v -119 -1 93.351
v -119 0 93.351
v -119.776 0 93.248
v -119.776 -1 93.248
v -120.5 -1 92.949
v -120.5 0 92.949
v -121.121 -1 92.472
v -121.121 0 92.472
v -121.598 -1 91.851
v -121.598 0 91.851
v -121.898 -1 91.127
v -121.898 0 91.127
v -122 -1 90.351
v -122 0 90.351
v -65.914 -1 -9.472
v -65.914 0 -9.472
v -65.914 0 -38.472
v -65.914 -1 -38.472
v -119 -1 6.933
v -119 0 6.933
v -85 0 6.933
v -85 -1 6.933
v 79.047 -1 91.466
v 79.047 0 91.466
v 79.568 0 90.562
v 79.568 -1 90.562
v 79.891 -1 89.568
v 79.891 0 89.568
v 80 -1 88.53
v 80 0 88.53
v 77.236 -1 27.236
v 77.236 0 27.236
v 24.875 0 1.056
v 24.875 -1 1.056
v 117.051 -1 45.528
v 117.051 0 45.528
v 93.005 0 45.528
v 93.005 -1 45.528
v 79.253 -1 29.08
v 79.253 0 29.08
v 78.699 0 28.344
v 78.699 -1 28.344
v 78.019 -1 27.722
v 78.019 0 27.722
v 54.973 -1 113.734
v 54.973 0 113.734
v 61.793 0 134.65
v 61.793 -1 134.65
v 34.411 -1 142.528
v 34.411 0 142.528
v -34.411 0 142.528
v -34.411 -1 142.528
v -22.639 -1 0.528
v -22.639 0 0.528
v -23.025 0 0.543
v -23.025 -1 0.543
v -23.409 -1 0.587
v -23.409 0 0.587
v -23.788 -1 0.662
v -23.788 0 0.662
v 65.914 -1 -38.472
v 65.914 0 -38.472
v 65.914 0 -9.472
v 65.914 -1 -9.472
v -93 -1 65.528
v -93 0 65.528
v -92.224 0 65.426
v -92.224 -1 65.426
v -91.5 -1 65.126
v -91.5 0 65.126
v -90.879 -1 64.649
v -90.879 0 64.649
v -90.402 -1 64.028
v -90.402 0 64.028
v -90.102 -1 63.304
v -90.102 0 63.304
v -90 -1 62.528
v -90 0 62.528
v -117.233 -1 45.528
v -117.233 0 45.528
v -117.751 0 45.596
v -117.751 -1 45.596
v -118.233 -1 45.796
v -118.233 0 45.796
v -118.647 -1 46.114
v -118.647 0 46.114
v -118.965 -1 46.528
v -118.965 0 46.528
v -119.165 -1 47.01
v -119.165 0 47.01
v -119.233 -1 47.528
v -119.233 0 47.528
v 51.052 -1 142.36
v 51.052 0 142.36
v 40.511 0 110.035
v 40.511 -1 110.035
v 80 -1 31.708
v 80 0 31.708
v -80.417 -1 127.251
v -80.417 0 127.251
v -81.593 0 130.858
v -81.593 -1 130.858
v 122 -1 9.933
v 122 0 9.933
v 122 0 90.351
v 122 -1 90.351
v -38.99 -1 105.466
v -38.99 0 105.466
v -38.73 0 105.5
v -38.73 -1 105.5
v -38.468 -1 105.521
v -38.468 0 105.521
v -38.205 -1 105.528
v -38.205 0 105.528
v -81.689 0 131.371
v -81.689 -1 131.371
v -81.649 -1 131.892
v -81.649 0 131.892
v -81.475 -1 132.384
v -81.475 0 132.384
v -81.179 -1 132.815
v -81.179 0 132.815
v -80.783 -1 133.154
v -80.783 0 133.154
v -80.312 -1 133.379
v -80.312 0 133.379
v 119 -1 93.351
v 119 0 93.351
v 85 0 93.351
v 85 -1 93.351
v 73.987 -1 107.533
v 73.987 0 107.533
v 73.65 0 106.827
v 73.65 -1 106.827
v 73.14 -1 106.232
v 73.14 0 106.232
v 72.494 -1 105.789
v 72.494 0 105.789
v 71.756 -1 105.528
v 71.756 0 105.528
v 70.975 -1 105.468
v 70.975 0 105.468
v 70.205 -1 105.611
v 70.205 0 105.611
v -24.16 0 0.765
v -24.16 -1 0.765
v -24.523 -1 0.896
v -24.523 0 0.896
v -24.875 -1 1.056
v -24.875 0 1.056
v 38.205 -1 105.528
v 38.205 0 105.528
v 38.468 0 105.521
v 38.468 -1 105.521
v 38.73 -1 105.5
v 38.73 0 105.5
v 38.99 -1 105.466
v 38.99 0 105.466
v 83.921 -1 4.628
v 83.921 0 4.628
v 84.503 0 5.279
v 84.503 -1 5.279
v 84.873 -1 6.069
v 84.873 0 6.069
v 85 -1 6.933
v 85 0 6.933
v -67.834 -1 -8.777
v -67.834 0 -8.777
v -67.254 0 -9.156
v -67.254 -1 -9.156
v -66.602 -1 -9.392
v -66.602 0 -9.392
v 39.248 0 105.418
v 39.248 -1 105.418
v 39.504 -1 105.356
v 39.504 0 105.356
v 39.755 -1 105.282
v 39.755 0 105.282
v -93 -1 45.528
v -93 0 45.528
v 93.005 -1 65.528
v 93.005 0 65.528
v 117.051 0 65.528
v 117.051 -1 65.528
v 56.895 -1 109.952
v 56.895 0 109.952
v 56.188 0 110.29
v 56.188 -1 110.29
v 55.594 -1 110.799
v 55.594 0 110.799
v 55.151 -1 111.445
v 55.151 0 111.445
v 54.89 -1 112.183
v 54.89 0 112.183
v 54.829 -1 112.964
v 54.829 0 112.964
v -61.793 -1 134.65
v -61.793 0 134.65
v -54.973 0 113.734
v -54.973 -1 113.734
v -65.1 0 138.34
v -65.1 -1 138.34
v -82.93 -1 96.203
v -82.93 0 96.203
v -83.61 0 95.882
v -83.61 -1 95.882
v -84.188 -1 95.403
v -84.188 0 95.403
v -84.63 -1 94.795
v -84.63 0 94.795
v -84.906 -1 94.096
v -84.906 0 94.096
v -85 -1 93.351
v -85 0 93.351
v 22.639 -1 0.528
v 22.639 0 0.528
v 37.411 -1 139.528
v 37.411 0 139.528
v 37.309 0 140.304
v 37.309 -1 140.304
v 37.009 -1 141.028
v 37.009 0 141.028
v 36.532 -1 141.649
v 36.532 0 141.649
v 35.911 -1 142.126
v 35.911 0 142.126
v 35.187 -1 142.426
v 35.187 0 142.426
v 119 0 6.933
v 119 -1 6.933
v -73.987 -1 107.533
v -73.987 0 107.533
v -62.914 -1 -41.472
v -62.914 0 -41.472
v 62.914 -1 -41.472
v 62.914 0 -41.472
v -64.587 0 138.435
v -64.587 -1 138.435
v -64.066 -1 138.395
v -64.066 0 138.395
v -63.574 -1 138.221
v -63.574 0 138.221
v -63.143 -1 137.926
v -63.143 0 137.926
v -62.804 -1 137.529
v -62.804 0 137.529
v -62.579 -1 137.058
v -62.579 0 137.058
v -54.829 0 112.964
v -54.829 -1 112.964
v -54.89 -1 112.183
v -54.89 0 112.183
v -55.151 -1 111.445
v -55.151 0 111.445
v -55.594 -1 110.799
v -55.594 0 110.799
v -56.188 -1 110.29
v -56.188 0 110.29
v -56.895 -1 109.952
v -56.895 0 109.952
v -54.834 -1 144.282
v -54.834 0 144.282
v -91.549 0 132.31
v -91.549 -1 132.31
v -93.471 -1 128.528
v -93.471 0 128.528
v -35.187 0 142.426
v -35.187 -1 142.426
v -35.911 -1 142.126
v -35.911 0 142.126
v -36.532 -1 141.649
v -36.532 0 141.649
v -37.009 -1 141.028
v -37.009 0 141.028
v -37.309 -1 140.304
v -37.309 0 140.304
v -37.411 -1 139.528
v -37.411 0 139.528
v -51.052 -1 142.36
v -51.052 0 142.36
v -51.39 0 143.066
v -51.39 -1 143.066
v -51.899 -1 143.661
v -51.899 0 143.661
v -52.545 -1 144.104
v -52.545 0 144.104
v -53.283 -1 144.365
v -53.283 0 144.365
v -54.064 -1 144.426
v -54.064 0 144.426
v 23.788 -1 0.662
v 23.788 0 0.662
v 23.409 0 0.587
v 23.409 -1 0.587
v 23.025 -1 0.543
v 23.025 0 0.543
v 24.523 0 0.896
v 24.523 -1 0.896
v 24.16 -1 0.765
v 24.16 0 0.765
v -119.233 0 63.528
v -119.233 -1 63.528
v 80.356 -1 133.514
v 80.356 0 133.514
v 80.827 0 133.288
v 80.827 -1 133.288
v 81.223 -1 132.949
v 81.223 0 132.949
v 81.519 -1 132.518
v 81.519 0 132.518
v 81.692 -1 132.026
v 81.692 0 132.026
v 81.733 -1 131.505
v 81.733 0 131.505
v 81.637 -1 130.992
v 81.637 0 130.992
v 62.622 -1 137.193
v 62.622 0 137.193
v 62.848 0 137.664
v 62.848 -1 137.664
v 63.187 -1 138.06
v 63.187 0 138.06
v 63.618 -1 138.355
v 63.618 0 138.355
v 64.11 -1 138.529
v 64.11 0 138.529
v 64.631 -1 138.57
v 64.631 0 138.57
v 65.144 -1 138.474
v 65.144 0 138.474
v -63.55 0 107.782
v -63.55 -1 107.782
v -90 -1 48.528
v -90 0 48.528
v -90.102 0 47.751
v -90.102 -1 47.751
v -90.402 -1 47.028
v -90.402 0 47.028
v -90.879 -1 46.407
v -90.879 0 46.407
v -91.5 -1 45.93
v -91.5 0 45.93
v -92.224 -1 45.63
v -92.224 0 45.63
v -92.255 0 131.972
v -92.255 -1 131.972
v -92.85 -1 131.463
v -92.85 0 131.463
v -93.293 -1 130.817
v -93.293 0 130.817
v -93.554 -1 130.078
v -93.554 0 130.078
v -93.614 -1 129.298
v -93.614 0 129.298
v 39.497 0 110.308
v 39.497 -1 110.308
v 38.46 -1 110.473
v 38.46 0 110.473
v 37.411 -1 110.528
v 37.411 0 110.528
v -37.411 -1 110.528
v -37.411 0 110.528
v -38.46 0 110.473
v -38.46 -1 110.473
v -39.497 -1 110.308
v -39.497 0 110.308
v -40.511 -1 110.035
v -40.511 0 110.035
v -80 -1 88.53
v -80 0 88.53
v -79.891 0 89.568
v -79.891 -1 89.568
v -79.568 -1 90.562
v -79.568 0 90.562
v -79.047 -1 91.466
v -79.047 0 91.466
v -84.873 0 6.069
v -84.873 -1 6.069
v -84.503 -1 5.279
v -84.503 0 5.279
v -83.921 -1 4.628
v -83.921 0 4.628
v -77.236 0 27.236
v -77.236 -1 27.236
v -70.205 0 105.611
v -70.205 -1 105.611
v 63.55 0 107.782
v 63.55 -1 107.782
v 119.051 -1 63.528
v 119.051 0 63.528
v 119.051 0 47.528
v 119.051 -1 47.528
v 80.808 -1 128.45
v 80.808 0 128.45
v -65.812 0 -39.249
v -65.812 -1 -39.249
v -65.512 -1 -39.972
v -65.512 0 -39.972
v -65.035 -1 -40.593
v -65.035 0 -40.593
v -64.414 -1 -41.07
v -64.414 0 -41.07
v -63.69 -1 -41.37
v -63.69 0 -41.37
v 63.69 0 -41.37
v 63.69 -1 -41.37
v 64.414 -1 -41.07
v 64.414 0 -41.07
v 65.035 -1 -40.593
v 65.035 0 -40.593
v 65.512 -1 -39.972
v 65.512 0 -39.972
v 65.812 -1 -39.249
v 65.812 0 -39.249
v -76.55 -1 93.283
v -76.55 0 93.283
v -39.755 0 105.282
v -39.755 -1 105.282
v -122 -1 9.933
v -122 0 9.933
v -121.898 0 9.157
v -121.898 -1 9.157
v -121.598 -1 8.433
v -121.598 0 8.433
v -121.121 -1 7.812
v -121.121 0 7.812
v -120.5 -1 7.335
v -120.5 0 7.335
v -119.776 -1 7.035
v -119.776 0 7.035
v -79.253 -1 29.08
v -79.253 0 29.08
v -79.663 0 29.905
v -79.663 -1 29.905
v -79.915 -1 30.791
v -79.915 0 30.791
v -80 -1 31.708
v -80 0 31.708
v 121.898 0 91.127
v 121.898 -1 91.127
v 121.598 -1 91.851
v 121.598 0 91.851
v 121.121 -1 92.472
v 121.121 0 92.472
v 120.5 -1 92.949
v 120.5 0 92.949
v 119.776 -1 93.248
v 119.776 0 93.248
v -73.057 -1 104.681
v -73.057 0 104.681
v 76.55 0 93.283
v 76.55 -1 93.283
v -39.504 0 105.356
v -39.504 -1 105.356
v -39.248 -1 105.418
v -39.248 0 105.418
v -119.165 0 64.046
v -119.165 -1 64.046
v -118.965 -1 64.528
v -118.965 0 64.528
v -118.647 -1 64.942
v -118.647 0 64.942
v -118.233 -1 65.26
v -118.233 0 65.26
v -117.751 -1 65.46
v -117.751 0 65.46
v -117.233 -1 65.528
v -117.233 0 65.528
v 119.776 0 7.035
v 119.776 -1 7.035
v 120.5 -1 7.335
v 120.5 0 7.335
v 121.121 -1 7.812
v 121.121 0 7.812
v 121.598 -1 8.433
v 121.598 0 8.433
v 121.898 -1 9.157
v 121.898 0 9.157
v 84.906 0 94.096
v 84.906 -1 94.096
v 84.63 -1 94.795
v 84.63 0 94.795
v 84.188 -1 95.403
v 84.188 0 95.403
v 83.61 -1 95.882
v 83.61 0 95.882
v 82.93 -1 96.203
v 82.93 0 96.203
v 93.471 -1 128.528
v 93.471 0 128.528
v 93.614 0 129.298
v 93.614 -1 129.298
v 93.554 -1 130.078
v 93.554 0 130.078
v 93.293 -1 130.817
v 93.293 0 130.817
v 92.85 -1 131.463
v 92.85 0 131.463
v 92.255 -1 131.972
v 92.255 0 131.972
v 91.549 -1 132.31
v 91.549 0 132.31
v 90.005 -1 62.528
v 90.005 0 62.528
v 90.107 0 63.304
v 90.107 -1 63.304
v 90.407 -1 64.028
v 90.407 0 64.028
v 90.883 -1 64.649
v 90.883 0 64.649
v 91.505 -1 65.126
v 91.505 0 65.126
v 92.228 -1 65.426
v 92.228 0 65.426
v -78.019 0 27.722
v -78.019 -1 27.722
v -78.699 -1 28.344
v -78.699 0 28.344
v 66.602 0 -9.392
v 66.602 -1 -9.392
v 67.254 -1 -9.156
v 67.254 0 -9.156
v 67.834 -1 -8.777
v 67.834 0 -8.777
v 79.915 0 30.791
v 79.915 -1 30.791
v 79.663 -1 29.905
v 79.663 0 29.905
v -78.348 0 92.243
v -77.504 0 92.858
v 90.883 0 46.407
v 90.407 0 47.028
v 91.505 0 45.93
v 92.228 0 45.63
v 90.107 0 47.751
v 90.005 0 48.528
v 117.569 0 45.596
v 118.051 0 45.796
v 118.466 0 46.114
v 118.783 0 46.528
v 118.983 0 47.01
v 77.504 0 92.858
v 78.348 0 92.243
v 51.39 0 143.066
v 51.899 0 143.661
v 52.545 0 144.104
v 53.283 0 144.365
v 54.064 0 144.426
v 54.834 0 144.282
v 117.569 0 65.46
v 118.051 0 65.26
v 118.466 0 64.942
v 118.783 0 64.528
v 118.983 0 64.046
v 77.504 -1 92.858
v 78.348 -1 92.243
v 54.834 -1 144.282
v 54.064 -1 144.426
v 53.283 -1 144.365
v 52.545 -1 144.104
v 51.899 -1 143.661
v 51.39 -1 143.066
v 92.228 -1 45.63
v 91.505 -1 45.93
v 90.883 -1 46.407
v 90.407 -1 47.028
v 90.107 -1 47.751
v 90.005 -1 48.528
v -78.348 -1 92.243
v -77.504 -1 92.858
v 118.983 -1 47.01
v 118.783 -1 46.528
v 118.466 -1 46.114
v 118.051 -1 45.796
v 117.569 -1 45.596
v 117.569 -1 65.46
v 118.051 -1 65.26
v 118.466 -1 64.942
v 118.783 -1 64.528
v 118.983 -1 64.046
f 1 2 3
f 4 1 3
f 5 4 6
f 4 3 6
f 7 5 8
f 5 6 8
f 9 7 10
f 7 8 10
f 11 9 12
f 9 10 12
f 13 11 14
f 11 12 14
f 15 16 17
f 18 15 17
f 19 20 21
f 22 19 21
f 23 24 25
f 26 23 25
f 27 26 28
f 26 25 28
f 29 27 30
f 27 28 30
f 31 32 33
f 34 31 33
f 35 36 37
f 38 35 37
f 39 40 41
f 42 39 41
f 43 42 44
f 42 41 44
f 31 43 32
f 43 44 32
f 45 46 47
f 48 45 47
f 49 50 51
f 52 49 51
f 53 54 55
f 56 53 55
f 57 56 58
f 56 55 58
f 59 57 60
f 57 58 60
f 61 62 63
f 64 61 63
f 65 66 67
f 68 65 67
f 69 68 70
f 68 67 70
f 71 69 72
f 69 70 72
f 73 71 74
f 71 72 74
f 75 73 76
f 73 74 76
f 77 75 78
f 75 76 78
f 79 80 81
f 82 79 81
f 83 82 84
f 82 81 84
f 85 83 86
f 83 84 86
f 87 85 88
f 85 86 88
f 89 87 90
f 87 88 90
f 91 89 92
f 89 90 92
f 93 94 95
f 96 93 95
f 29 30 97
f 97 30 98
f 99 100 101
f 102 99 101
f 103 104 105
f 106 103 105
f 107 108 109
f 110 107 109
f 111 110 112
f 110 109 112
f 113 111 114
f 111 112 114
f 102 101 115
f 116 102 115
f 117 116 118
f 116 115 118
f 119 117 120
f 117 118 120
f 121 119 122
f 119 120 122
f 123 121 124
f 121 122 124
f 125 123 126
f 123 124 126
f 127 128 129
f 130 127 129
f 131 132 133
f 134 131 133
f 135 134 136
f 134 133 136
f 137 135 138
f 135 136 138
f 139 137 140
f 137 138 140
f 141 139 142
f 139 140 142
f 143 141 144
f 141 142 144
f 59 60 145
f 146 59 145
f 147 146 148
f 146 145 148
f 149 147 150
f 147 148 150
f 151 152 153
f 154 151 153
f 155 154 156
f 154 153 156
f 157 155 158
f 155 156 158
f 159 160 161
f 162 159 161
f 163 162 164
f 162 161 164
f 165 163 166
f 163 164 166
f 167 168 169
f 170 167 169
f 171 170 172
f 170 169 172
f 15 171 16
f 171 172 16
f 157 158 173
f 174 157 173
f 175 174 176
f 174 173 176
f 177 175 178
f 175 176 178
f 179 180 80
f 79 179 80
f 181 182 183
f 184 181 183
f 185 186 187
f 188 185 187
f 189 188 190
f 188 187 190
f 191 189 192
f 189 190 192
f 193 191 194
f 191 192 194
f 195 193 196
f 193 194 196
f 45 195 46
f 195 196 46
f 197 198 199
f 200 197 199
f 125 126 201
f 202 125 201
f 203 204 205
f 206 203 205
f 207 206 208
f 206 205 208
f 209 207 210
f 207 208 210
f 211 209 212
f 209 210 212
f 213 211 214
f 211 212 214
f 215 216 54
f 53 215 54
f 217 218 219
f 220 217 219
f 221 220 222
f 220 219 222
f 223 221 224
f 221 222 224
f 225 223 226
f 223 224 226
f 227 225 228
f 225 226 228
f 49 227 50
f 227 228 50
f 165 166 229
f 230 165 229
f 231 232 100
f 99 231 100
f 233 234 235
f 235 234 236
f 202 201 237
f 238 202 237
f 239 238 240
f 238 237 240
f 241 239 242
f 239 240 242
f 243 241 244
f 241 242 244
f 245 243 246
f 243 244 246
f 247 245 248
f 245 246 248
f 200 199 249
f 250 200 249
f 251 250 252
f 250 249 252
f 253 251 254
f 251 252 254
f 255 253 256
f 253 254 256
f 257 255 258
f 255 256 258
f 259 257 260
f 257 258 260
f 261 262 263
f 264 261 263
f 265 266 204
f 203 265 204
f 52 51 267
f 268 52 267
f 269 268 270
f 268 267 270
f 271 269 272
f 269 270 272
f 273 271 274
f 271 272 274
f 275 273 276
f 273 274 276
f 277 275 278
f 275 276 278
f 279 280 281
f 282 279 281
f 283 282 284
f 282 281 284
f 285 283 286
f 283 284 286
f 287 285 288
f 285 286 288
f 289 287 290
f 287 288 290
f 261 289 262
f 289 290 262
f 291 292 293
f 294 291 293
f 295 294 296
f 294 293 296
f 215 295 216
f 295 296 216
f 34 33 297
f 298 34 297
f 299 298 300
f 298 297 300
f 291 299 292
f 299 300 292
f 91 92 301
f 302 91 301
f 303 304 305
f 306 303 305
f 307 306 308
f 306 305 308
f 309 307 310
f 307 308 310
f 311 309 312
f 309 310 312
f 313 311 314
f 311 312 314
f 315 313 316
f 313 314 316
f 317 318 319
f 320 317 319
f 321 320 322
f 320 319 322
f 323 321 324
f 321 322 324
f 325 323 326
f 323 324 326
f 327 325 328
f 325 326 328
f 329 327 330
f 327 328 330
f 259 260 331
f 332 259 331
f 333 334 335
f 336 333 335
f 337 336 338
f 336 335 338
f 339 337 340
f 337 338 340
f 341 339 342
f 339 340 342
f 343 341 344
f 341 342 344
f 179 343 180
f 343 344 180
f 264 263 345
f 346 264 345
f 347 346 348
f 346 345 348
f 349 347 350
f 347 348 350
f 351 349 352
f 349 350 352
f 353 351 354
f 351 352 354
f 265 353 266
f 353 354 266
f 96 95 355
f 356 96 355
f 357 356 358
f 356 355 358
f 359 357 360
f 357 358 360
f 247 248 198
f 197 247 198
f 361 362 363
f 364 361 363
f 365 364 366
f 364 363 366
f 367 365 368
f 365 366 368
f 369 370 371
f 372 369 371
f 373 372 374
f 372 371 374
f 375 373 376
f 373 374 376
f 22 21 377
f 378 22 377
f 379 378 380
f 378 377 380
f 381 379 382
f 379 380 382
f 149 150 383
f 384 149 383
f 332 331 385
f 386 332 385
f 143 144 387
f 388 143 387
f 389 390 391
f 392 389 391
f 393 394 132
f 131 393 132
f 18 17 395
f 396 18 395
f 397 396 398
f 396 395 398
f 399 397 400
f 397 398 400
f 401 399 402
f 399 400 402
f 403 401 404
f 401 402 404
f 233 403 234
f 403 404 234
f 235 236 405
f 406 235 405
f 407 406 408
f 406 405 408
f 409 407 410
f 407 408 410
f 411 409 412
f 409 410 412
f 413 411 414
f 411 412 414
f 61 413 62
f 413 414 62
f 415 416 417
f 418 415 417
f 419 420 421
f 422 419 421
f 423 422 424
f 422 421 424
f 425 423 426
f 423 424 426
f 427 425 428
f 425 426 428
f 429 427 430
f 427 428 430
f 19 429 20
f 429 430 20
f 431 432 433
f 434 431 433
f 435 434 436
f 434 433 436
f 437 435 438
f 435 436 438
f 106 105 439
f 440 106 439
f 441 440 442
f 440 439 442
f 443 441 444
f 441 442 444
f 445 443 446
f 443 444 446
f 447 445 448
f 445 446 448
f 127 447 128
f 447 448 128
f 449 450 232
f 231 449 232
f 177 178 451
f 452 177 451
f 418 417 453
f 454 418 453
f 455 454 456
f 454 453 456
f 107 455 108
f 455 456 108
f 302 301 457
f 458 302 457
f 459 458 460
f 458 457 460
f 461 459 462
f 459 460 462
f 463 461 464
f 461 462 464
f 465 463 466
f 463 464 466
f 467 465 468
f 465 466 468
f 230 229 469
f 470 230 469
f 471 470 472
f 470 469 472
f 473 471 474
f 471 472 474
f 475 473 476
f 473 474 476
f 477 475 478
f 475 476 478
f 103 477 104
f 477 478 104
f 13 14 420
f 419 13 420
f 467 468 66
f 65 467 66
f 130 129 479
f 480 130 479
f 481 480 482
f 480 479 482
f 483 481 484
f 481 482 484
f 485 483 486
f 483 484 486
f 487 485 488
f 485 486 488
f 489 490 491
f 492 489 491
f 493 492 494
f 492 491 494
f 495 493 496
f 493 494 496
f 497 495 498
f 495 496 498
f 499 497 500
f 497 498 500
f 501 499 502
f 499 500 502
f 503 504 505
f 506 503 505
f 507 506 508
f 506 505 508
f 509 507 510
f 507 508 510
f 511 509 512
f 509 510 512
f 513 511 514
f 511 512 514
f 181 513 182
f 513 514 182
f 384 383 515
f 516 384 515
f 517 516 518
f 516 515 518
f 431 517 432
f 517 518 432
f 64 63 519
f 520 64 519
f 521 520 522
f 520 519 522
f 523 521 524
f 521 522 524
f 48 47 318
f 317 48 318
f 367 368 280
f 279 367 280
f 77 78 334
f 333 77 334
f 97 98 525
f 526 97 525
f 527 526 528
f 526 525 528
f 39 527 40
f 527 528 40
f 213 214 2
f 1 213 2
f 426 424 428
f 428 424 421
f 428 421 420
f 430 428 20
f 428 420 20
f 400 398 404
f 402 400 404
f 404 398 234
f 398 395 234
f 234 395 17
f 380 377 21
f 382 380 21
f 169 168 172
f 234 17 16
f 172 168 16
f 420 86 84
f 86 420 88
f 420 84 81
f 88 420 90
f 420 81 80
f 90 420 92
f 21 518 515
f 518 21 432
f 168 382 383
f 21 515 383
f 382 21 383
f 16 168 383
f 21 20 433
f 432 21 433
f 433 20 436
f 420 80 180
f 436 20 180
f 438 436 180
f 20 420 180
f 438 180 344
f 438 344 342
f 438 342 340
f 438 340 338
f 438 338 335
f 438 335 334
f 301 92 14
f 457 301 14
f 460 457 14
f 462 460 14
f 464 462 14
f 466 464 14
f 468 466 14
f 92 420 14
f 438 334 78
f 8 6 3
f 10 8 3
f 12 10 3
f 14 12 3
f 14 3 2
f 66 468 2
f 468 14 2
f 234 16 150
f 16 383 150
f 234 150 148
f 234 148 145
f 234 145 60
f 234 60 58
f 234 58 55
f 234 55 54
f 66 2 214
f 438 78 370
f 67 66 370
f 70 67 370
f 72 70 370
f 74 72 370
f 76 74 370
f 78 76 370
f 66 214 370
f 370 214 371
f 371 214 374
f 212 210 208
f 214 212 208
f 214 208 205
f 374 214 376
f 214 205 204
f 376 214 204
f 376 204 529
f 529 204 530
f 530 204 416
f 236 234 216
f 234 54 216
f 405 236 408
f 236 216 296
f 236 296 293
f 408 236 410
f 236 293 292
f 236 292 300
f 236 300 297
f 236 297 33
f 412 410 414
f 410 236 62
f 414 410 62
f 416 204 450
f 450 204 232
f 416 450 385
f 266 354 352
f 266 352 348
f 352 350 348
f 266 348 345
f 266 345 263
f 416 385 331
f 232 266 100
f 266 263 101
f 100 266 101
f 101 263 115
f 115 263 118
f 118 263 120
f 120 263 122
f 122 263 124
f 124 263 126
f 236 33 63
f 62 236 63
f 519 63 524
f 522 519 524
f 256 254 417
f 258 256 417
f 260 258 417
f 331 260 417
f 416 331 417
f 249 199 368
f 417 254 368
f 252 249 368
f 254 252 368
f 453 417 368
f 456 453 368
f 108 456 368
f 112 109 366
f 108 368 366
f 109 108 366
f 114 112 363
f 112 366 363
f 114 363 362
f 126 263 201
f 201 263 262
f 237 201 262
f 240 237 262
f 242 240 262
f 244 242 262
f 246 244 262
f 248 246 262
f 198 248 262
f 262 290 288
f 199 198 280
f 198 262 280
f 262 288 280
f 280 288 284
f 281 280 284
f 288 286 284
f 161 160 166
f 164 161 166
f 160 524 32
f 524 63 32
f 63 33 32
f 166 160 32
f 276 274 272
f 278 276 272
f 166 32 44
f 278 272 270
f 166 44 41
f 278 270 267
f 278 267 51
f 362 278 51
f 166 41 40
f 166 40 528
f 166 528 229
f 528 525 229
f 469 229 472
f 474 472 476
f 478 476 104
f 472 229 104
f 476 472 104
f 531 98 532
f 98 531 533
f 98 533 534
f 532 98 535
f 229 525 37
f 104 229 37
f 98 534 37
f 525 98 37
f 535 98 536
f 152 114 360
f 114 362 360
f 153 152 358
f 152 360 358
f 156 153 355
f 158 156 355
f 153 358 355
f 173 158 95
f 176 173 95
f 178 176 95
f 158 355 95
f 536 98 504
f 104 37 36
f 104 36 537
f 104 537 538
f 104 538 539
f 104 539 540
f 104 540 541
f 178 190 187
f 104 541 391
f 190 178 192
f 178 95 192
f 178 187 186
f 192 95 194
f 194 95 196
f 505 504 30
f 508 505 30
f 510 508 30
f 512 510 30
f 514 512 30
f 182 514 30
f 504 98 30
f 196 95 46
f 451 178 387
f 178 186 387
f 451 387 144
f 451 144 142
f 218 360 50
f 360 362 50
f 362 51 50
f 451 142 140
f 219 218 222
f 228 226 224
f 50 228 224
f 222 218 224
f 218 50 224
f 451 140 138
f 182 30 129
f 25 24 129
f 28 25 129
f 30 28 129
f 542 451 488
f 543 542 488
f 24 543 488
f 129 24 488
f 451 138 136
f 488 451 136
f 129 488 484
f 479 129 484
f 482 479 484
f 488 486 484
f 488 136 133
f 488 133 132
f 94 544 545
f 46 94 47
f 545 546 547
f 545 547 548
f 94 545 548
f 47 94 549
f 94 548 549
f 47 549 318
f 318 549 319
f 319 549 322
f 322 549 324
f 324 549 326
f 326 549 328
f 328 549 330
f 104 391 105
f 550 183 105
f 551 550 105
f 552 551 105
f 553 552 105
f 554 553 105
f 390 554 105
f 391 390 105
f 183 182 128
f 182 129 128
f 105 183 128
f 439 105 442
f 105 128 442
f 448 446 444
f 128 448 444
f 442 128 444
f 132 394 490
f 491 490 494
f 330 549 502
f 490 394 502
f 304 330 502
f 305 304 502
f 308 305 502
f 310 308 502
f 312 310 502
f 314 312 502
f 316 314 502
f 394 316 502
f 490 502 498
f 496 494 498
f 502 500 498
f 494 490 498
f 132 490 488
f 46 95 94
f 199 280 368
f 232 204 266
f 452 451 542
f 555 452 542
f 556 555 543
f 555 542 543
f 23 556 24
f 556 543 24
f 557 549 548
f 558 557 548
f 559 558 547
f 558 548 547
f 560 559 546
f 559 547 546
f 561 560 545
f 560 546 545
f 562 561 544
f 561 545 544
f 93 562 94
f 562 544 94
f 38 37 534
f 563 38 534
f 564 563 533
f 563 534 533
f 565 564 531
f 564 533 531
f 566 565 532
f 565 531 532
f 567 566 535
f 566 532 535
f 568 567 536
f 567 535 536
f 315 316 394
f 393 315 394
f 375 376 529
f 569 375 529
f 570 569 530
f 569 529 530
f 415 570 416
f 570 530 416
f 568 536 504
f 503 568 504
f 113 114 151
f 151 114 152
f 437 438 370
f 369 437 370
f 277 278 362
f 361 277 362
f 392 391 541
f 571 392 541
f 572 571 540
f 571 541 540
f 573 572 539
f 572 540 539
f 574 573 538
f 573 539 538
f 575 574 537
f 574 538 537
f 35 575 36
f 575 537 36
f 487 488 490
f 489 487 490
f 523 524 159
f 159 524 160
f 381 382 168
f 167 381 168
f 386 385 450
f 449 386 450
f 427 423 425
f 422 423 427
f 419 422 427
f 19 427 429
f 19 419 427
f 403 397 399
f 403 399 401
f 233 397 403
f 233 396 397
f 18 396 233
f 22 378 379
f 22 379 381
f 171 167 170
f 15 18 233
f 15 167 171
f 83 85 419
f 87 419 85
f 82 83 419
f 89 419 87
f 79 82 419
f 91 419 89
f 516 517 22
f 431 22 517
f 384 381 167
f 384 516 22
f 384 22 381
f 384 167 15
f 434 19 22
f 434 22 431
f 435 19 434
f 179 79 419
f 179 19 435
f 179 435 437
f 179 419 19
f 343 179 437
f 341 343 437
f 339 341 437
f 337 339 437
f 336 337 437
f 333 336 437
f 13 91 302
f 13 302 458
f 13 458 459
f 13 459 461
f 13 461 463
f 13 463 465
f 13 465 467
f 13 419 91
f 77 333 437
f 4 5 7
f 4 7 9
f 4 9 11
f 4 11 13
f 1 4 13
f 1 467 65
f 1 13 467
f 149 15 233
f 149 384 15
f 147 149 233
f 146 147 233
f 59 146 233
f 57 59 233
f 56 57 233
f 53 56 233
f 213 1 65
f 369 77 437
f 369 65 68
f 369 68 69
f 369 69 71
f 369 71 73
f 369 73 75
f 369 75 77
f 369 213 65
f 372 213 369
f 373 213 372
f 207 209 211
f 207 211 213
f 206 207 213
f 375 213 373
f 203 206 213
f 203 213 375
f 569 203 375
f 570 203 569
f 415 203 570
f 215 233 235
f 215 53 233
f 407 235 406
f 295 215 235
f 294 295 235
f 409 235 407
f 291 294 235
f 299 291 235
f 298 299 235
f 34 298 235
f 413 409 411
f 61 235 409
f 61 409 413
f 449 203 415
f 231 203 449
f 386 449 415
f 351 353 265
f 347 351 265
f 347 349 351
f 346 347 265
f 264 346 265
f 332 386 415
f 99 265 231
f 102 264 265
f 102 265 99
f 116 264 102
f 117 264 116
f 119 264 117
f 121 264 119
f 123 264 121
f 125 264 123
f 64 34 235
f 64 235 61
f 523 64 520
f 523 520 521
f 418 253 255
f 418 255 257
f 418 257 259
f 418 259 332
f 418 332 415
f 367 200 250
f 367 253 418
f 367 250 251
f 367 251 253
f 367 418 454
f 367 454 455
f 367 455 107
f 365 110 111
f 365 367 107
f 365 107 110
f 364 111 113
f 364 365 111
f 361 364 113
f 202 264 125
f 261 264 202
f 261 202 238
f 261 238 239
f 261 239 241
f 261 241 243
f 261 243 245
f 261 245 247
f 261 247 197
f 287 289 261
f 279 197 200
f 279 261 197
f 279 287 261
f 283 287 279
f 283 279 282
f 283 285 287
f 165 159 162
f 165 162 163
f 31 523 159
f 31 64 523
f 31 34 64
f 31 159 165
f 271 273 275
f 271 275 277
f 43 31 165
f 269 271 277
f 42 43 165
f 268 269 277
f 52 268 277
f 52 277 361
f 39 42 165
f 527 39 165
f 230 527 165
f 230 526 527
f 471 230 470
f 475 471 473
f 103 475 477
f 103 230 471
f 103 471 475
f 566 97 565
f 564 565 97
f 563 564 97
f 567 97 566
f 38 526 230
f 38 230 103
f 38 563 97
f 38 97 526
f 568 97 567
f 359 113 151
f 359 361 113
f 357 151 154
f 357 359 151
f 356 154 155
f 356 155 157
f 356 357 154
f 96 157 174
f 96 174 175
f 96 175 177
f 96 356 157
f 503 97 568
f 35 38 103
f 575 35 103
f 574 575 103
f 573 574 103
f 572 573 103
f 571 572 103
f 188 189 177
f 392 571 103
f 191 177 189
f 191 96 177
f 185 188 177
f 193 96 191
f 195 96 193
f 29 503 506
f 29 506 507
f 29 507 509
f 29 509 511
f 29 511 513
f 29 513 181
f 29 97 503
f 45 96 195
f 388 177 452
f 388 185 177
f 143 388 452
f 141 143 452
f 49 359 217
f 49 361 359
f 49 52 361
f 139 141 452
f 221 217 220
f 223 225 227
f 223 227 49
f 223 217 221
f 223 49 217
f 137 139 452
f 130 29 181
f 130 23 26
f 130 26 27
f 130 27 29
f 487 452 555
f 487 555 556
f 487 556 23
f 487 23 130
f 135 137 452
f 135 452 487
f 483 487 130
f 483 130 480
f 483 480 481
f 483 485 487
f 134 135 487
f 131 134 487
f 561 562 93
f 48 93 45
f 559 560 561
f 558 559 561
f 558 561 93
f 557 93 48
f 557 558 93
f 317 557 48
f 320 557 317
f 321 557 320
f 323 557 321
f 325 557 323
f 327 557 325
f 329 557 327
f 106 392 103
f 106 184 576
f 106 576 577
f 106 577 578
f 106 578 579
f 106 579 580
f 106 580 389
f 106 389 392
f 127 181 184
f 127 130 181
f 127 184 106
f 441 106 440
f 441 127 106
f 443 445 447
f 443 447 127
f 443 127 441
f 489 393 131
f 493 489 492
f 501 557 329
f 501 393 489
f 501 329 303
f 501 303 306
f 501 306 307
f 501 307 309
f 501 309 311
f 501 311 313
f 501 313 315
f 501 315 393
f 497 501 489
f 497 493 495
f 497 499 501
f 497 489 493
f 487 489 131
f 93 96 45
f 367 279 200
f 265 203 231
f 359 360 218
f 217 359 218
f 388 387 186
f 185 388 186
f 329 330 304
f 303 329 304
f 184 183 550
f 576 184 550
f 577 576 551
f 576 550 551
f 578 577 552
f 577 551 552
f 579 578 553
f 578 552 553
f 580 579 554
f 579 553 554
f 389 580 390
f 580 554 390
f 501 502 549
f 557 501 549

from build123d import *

# Parameters (mm, degrees)
F1_DEPTH = 1


# Not quite as in the source:
# - a feature names something its author has since deleted; it is built from what else it names


with BuildPart() as f1:
    # F0 (on Front) → F1 (new body)
    with BuildSketch(Plane.XZ):
        with BuildLine():
            ThreePointArc((83.920553199, 4.6283250442), (84.7167682637, 5.6605226942), (85, 6.932988883))
            Line((85, 6.932988883), (85, 25.527864045))
            Line((85, 25.527864045), (85, 45.527864045))
            Line((85, 45.527864045), (85, 55.527864045))
            Line((85, 55.527864045), (85, 65.527864045))
            Line((85, 65.527864045), (85, 90.527864045))
            Line((85, 90.527864045), (85, 93.3506543745))
            ThreePointArc((85, 93.3506543745), (84.4279811983, 95.1127290894), (82.9300617995, 96.202843893))
            Line((82.9300617995, 96.202843893), (71.5072983948, 99.9276580467))
            Line((71.5072983948, 99.9276580467), (62, 103.027864045))
            Line((62, 103.027864045), (52.4927016052, 106.1280700433))
            Line((52.4927016052, 106.1280700433), (40.5109515892, 110.0351624398))
            ThreePointArc((40.5109515892, 110.0351624398), (38.9803022245, 110.4039205441), (37.4107455909, 110.527864045))
            Line((37.4107455909, 110.527864045), (37.4107455909, 139.527864045))
            ThreePointArc((37.4107455909, 139.527864045), (36.5320659345, 141.6491843886), (34.4107455909, 142.527864045))
            Line((34.4107455909, 142.527864045), (0, 142.527864045))
            Line((0, 142.527864045), (-34.4107455909, 142.527864045))
            ThreePointArc((-34.4107455909, 142.527864045), (-36.5320659345, 141.6491843886), (-37.4107455909, 139.527864045))
            Line((-37.4107455909, 139.527864045), (-37.4107455909, 110.527864045))
            ThreePointArc((-37.4107455909, 110.527864045), (-38.9803022245, 110.4039205441), (-40.5109515892, 110.0351624398))
            Line((-40.5109515892, 110.0351624398), (-52.4927016052, 106.1280700433))
            Line((-52.4927016052, 106.1280700433), (-62, 103.027864045))
            Line((-62, 103.027864045), (-71.5072983948, 99.9276580467))
            Line((-71.5072983948, 99.9276580467), (-82.9300617995, 96.202843893))
            ThreePointArc((-82.9300617995, 96.202843893), (-84.4279811983, 95.1127290894), (-85, 93.3506543745))
            Line((-85, 93.3506543745), (-85, 90.527864045))
            Line((-85, 90.527864045), (-85, 65.527864045))
            Line((-85, 65.527864045), (-85, 45.527864045))
            Line((-85, 45.527864045), (-85, 25.527864045))
            Line((-85, 25.527864045), (-85, 6.932988883))
            ThreePointArc((-85, 6.932988883), (-84.7167682637, 5.6605226942), (-83.920553199, 4.6283250442))
            Line((-83.920553199, 4.6283250442), (-67.8344033934, -8.7767997938))
            ThreePointArc((-67.8344033934, -8.7767997938), (-66.9351259857, -9.292950688), (-65.9138501945, -9.472135955))
            Line((-65.9138501945, -9.472135955), (-65.9138501945, -38.472135955))
            ThreePointArc((-65.9138501945, -38.472135955), (-65.035170538, -40.5934562986), (-62.9138501945, -41.472135955))
            Line((-62.9138501945, -41.472135955), (0, -41.472135955))
            Line((0, -41.472135955), (62.9138501945, -41.472135955))
            ThreePointArc((62.9138501945, -41.472135955), (65.035170538, -40.5934562986), (65.9138501945, -38.472135955))
            Line((65.9138501945, -38.472135955), (65.9138501945, -9.472135955))
            ThreePointArc((65.9138501945, -9.472135955), (66.9351259857, -9.292950688), (67.8344033934, -8.7767997938))
            Line((67.8344033934, -8.7767997938), (83.920553199, 4.6283250442))
        make_face()
        with BuildLine():
            ThreePointArc((38.9901511122, 105.4658922946), (39.3764477711, 105.3887881754), (39.7554757946, 105.2815132424))
            Line((39.7554757946, 105.2815132424), (76.5501029992, 93.2832652409))
            ThreePointArc((76.5501029992, 93.2832652409), (77.9421273317, 92.5723733654), (79.0466353305, 91.466407235))
            ThreePointArc((79.0466353305, 91.466407235), (79.7556900999, 90.0734462394), (80, 88.5296160435))
            Line((80, 88.5296160435), (80, 31.7082039325))
            ThreePointArc((80, 31.7082039325), (79.8096917889, 30.3418712879), (79.2532540418, 29.0795483719))
            ThreePointArc((79.2532540418, 29.0795483719), (78.3730446274, 28.0173273508), (77.2360679775, 27.2360679775))
            Line((77.2360679775, 27.2360679775), (24.8753882025, 1.05572809))
            ThreePointArc((24.8753882025, 1.05572809), (24.3431697998, 0.8271304186), (23.7880848277, 0.6616190977))
            ThreePointArc((23.7880848277, 0.6616190977), (23.2175828225, 0.5614153774), (22.639320225, 0.527864045))
            Line((22.639320225, 0.527864045), (0, 0.527864045))
            Line((0, 0.527864045), (-22.639320225, 0.527864045))
            ThreePointArc((-22.639320225, 0.527864045), (-23.2175828225, 0.5614153774), (-23.7880848277, 0.6616190977))
            ThreePointArc((-23.7880848277, 0.6616190977), (-24.3431697998, 0.8271304186), (-24.8753882025, 1.05572809))
            Line((-24.8753882025, 1.05572809), (-77.2360679775, 27.2360679775))
            ThreePointArc((-77.2360679775, 27.2360679775), (-78.3730446274, 28.0173273508), (-79.2532540418, 29.0795483719))
            ThreePointArc((-79.2532540418, 29.0795483719), (-79.8096917889, 30.3418712879), (-80, 31.7082039325))
            Line((-80, 31.7082039325), (-80, 88.5296160435))
            ThreePointArc((-80, 88.5296160435), (-79.7556900999, 90.0734462394), (-79.0466353305, 91.466407235))
            ThreePointArc((-79.0466353305, 91.466407235), (-77.9421273317, 92.5723733654), (-76.5501029992, 93.2832652409))
            Line((-76.5501029992, 93.2832652409), (-39.7554757946, 105.2815132424))
            ThreePointArc((-39.7554757946, 105.2815132424), (-39.3764477711, 105.3887881754), (-38.9901511122, 105.4658922946))
            ThreePointArc((-38.9901511122, 105.4658922946), (-38.5989834865, 105.5123470296), (-38.2053727955, 105.527864045))
            Line((-38.2053727955, 105.527864045), (0, 105.527864045))
            Line((0, 105.527864045), (38.2053727955, 105.527864045))
            ThreePointArc((38.2053727955, 105.527864045), (38.5989834865, 105.5123470296), (38.9901511122, 105.4658922946))
        make_face(mode=Mode.SUBTRACT)
        with BuildLine():
            Line((71.5072983948, 99.9276580467), (82.9300617995, 96.202843893))
            Line((82.9300617995, 96.202843893), (93.4707621937, 128.5276584354))
            ThreePointArc((93.4707621937, 128.5276584354), (93.2930282304, 130.8168697792), (91.5486344748, 132.3099097533))
            Line((91.5486344748, 132.3099097533), (54.8339033014, 144.2821047011))
            ThreePointArc((54.8339033014, 144.2821047011), (52.5446919576, 144.1043707378), (51.0516519835, 142.3599769822))
            Line((51.0516519835, 142.3599769822), (40.5109515892, 110.0351624398))
            Line((40.5109515892, 110.0351624398), (52.4927016052, 106.1280700433))
            Line((52.4927016052, 106.1280700433), (62, 103.027864045))
            Line((62, 103.027864045), (71.5072983948, 99.9276580467))
        make_face()
        with BuildLine():
            Line((70.2052118755, 105.6113690436), (63.5501029992, 107.7815132424))
            Line((63.5501029992, 107.7815132424), (56.8949941228, 109.9516574412))
            ThreePointArc((56.8949941228, 109.9516574412), (55.1506003672, 111.4446974153), (54.9728664038, 113.7339087592))
            Line((54.9728664038, 113.7339087592), (61.7933196001, 134.6499652278))
            Line((61.7933196001, 134.6499652278), (62.6224189104, 137.192536446))
            ThreePointArc((62.6224189104, 137.192536446), (63.6177788931, 138.3554656164), (65.143919789, 138.4739549253))
            Line((65.143919789, 138.4739549253), (80.3555972207, 133.513625328))
            ThreePointArc((80.3555972207, 133.513625328), (81.5185263911, 132.5182653453), (81.6370157, 130.9921244494))
            Line((81.6370157, 130.9921244494), (80.8079163897, 128.4495532311))
            Line((80.8079163897, 128.4495532311), (73.9874631935, 107.5334967625))
            ThreePointArc((73.9874631935, 107.5334967625), (72.4944232194, 105.789103007), (70.2052118755, 105.6113690436))
        make_face(mode=Mode.SUBTRACT)
        with BuildLine():
            Line((85, 25.527864045), (85, 6.932988883))
            Line((85, 6.932988883), (114, 6.932988883))
            Line((114, 6.932988883), (117, 6.932988883))
            Line((117, 6.932988883), (119, 6.932988883))
            ThreePointArc((119, 6.932988883), (121.1213203436, 7.8116685394), (122, 9.932988883))
            Line((122, 9.932988883), (122, 90.3506543745))
            ThreePointArc((122, 90.3506543745), (121.1213203436, 92.4719747181), (119, 93.3506543745))
            Line((119, 93.3506543745), (117, 93.3506543745))
            Line((117, 93.3506543745), (114, 93.3506543745))
            Line((114, 93.3506543745), (85, 93.3506543745))
            Line((85, 93.3506543745), (85, 90.527864045))
            Line((85, 90.527864045), (85, 65.527864045))
            Line((85, 65.527864045), (85, 55.527864045))
            Line((85, 55.527864045), (85, 45.527864045))
            Line((85, 45.527864045), (85, 25.527864045))
        make_face()
        with BuildLine():
            Line((90.0046601892, 48.527864045), (90.0046601892, 55.527864045))
            Line((90.0046601892, 55.527864045), (90.0046601892, 62.527864045))
            ThreePointArc((90.0046601892, 62.527864045), (90.8833398456, 64.6491843886), (93.0046601892, 65.527864045))
            Line((93.0046601892, 65.527864045), (117.0514340997, 65.527864045))
            ThreePointArc((117.0514340997, 65.527864045), (118.465647662, 64.9420776074), (119.0514340997, 63.527864045))
            Line((119.0514340997, 63.527864045), (119.0514340997, 55.527864045))
            Line((119.0514340997, 55.527864045), (119.0514340997, 47.527864045))
            ThreePointArc((119.0514340997, 47.527864045), (118.465647662, 46.1136504826), (117.0514340997, 45.527864045))
            Line((117.0514340997, 45.527864045), (93.0046601892, 45.527864045))
            ThreePointArc((93.0046601892, 45.527864045), (90.8833398456, 46.4065437014), (90.0046601892, 48.527864045))
        make_face(mode=Mode.SUBTRACT)
        with BuildLine():
            Line((-114, 6.932988883), (-85, 6.932988883))
            Line((-85, 6.932988883), (-85, 25.527864045))
            Line((-85, 25.527864045), (-85, 45.527864045))
            Line((-85, 45.527864045), (-85, 65.527864045))
            Line((-85, 65.527864045), (-85, 90.527864045))
            Line((-85, 90.527864045), (-85, 93.3506543745))
            Line((-85, 93.3506543745), (-114, 93.3506543745))
            Line((-114, 93.3506543745), (-117, 93.3506543745))
            Line((-117, 93.3506543745), (-119, 93.3506543745))
            ThreePointArc((-119, 93.3506543745), (-121.1213203436, 92.4719747181), (-122, 90.3506543745))
            Line((-122, 90.3506543745), (-122, 9.932988883))
            ThreePointArc((-122, 9.932988883), (-121.1213203436, 7.8116685394), (-119, 6.932988883))
            Line((-119, 6.932988883), (-117, 6.932988883))
            Line((-117, 6.932988883), (-114, 6.932988883))
        make_face()
        with BuildLine():
            Line((-90, 55.527864045), (-90, 48.527864045))
            ThreePointArc((-90, 48.527864045), (-90.8786796564, 46.4065437014), (-93, 45.527864045))
            Line((-93, 45.527864045), (-108.2668378949, 45.527864045))
            Line((-108.2668378949, 45.527864045), (-115, 45.527864045))
            Line((-115, 45.527864045), (-116, 45.527864045))
            Line((-116, 45.527864045), (-117.232930243, 45.527864045))
            ThreePointArc((-117.232930243, 45.527864045), (-118.6471438054, 46.1136504826), (-119.232930243, 47.527864045))
            Line((-119.232930243, 47.527864045), (-119.232930243, 55.527864045))
            Line((-119.232930243, 55.527864045), (-119.232930243, 63.527864045))
            ThreePointArc((-119.232930243, 63.527864045), (-118.6471438054, 64.9420776074), (-117.232930243, 65.527864045))
            Line((-117.232930243, 65.527864045), (-116, 65.527864045))
            Line((-116, 65.527864045), (-115, 65.527864045))
            Line((-115, 65.527864045), (-113.2454946637, 65.527864045))
            Line((-113.2454946637, 65.527864045), (-93, 65.527864045))
            ThreePointArc((-93, 65.527864045), (-90.8786796564, 64.6491843886), (-90, 62.527864045))
            Line((-90, 62.527864045), (-90, 55.527864045))
        make_face(mode=Mode.SUBTRACT)
        with BuildLine():
            Line((-93.4707621937, 128.5276584354), (-82.9300617995, 96.202843893))
            Line((-82.9300617995, 96.202843893), (-71.5072983948, 99.9276580467))
            Line((-71.5072983948, 99.9276580467), (-62, 103.027864045))
            Line((-62, 103.027864045), (-52.4927016052, 106.1280700433))
            Line((-52.4927016052, 106.1280700433), (-40.5109515892, 110.0351624398))
            Line((-40.5109515892, 110.0351624398), (-51.0516519835, 142.3599769822))
            ThreePointArc((-51.0516519835, 142.3599769822), (-52.5446919576, 144.1043707378), (-54.8339033014, 144.2821047011))
            Line((-54.8339033014, 144.2821047011), (-91.5486344748, 132.3099097533))
            ThreePointArc((-91.5486344748, 132.3099097533), (-93.2930282304, 130.8168697792), (-93.4707621937, 128.5276584354))
        make_face()
        with BuildLine():
            Line((-56.8949941228, 109.9516574412), (-63.5501029992, 107.7815132424))
            Line((-63.5501029992, 107.7815132424), (-70.2052118755, 105.6113690436))
            Line((-70.2052118755, 105.6113690436), (-73.057401394, 104.6813072441))
            Line((-73.057401394, 104.6813072441), (-73.9874631935, 107.5334967625))
            Line((-73.9874631935, 107.5334967625), (-80.4169615485, 127.2506250513))
            Line((-80.4169615485, 127.2506250513), (-81.5932293444, 130.8578462922))
            ThreePointArc((-81.5932293444, 130.8578462922), (-81.4747400355, 132.3839871881), (-80.3118108651, 133.3793471708))
            Line((-80.3118108651, 133.3793471708), (-65.1001334334, 138.3396767681))
            ThreePointArc((-65.1001334334, 138.3396767681), (-63.5739925375, 138.2211874592), (-62.5786325548, 137.0582582888))
            Line((-62.5786325548, 137.0582582888), (-61.7933196001, 134.6499652278))
            Line((-61.7933196001, 134.6499652278), (-54.9728664038, 113.7339087592))
            ThreePointArc((-54.9728664038, 113.7339087592), (-55.1506003672, 111.4446974153), (-56.8949941228, 109.9516574412))
        make_face(mode=Mode.SUBTRACT)
    extrude(amount=F1_DEPTH)


solid = f1.part
